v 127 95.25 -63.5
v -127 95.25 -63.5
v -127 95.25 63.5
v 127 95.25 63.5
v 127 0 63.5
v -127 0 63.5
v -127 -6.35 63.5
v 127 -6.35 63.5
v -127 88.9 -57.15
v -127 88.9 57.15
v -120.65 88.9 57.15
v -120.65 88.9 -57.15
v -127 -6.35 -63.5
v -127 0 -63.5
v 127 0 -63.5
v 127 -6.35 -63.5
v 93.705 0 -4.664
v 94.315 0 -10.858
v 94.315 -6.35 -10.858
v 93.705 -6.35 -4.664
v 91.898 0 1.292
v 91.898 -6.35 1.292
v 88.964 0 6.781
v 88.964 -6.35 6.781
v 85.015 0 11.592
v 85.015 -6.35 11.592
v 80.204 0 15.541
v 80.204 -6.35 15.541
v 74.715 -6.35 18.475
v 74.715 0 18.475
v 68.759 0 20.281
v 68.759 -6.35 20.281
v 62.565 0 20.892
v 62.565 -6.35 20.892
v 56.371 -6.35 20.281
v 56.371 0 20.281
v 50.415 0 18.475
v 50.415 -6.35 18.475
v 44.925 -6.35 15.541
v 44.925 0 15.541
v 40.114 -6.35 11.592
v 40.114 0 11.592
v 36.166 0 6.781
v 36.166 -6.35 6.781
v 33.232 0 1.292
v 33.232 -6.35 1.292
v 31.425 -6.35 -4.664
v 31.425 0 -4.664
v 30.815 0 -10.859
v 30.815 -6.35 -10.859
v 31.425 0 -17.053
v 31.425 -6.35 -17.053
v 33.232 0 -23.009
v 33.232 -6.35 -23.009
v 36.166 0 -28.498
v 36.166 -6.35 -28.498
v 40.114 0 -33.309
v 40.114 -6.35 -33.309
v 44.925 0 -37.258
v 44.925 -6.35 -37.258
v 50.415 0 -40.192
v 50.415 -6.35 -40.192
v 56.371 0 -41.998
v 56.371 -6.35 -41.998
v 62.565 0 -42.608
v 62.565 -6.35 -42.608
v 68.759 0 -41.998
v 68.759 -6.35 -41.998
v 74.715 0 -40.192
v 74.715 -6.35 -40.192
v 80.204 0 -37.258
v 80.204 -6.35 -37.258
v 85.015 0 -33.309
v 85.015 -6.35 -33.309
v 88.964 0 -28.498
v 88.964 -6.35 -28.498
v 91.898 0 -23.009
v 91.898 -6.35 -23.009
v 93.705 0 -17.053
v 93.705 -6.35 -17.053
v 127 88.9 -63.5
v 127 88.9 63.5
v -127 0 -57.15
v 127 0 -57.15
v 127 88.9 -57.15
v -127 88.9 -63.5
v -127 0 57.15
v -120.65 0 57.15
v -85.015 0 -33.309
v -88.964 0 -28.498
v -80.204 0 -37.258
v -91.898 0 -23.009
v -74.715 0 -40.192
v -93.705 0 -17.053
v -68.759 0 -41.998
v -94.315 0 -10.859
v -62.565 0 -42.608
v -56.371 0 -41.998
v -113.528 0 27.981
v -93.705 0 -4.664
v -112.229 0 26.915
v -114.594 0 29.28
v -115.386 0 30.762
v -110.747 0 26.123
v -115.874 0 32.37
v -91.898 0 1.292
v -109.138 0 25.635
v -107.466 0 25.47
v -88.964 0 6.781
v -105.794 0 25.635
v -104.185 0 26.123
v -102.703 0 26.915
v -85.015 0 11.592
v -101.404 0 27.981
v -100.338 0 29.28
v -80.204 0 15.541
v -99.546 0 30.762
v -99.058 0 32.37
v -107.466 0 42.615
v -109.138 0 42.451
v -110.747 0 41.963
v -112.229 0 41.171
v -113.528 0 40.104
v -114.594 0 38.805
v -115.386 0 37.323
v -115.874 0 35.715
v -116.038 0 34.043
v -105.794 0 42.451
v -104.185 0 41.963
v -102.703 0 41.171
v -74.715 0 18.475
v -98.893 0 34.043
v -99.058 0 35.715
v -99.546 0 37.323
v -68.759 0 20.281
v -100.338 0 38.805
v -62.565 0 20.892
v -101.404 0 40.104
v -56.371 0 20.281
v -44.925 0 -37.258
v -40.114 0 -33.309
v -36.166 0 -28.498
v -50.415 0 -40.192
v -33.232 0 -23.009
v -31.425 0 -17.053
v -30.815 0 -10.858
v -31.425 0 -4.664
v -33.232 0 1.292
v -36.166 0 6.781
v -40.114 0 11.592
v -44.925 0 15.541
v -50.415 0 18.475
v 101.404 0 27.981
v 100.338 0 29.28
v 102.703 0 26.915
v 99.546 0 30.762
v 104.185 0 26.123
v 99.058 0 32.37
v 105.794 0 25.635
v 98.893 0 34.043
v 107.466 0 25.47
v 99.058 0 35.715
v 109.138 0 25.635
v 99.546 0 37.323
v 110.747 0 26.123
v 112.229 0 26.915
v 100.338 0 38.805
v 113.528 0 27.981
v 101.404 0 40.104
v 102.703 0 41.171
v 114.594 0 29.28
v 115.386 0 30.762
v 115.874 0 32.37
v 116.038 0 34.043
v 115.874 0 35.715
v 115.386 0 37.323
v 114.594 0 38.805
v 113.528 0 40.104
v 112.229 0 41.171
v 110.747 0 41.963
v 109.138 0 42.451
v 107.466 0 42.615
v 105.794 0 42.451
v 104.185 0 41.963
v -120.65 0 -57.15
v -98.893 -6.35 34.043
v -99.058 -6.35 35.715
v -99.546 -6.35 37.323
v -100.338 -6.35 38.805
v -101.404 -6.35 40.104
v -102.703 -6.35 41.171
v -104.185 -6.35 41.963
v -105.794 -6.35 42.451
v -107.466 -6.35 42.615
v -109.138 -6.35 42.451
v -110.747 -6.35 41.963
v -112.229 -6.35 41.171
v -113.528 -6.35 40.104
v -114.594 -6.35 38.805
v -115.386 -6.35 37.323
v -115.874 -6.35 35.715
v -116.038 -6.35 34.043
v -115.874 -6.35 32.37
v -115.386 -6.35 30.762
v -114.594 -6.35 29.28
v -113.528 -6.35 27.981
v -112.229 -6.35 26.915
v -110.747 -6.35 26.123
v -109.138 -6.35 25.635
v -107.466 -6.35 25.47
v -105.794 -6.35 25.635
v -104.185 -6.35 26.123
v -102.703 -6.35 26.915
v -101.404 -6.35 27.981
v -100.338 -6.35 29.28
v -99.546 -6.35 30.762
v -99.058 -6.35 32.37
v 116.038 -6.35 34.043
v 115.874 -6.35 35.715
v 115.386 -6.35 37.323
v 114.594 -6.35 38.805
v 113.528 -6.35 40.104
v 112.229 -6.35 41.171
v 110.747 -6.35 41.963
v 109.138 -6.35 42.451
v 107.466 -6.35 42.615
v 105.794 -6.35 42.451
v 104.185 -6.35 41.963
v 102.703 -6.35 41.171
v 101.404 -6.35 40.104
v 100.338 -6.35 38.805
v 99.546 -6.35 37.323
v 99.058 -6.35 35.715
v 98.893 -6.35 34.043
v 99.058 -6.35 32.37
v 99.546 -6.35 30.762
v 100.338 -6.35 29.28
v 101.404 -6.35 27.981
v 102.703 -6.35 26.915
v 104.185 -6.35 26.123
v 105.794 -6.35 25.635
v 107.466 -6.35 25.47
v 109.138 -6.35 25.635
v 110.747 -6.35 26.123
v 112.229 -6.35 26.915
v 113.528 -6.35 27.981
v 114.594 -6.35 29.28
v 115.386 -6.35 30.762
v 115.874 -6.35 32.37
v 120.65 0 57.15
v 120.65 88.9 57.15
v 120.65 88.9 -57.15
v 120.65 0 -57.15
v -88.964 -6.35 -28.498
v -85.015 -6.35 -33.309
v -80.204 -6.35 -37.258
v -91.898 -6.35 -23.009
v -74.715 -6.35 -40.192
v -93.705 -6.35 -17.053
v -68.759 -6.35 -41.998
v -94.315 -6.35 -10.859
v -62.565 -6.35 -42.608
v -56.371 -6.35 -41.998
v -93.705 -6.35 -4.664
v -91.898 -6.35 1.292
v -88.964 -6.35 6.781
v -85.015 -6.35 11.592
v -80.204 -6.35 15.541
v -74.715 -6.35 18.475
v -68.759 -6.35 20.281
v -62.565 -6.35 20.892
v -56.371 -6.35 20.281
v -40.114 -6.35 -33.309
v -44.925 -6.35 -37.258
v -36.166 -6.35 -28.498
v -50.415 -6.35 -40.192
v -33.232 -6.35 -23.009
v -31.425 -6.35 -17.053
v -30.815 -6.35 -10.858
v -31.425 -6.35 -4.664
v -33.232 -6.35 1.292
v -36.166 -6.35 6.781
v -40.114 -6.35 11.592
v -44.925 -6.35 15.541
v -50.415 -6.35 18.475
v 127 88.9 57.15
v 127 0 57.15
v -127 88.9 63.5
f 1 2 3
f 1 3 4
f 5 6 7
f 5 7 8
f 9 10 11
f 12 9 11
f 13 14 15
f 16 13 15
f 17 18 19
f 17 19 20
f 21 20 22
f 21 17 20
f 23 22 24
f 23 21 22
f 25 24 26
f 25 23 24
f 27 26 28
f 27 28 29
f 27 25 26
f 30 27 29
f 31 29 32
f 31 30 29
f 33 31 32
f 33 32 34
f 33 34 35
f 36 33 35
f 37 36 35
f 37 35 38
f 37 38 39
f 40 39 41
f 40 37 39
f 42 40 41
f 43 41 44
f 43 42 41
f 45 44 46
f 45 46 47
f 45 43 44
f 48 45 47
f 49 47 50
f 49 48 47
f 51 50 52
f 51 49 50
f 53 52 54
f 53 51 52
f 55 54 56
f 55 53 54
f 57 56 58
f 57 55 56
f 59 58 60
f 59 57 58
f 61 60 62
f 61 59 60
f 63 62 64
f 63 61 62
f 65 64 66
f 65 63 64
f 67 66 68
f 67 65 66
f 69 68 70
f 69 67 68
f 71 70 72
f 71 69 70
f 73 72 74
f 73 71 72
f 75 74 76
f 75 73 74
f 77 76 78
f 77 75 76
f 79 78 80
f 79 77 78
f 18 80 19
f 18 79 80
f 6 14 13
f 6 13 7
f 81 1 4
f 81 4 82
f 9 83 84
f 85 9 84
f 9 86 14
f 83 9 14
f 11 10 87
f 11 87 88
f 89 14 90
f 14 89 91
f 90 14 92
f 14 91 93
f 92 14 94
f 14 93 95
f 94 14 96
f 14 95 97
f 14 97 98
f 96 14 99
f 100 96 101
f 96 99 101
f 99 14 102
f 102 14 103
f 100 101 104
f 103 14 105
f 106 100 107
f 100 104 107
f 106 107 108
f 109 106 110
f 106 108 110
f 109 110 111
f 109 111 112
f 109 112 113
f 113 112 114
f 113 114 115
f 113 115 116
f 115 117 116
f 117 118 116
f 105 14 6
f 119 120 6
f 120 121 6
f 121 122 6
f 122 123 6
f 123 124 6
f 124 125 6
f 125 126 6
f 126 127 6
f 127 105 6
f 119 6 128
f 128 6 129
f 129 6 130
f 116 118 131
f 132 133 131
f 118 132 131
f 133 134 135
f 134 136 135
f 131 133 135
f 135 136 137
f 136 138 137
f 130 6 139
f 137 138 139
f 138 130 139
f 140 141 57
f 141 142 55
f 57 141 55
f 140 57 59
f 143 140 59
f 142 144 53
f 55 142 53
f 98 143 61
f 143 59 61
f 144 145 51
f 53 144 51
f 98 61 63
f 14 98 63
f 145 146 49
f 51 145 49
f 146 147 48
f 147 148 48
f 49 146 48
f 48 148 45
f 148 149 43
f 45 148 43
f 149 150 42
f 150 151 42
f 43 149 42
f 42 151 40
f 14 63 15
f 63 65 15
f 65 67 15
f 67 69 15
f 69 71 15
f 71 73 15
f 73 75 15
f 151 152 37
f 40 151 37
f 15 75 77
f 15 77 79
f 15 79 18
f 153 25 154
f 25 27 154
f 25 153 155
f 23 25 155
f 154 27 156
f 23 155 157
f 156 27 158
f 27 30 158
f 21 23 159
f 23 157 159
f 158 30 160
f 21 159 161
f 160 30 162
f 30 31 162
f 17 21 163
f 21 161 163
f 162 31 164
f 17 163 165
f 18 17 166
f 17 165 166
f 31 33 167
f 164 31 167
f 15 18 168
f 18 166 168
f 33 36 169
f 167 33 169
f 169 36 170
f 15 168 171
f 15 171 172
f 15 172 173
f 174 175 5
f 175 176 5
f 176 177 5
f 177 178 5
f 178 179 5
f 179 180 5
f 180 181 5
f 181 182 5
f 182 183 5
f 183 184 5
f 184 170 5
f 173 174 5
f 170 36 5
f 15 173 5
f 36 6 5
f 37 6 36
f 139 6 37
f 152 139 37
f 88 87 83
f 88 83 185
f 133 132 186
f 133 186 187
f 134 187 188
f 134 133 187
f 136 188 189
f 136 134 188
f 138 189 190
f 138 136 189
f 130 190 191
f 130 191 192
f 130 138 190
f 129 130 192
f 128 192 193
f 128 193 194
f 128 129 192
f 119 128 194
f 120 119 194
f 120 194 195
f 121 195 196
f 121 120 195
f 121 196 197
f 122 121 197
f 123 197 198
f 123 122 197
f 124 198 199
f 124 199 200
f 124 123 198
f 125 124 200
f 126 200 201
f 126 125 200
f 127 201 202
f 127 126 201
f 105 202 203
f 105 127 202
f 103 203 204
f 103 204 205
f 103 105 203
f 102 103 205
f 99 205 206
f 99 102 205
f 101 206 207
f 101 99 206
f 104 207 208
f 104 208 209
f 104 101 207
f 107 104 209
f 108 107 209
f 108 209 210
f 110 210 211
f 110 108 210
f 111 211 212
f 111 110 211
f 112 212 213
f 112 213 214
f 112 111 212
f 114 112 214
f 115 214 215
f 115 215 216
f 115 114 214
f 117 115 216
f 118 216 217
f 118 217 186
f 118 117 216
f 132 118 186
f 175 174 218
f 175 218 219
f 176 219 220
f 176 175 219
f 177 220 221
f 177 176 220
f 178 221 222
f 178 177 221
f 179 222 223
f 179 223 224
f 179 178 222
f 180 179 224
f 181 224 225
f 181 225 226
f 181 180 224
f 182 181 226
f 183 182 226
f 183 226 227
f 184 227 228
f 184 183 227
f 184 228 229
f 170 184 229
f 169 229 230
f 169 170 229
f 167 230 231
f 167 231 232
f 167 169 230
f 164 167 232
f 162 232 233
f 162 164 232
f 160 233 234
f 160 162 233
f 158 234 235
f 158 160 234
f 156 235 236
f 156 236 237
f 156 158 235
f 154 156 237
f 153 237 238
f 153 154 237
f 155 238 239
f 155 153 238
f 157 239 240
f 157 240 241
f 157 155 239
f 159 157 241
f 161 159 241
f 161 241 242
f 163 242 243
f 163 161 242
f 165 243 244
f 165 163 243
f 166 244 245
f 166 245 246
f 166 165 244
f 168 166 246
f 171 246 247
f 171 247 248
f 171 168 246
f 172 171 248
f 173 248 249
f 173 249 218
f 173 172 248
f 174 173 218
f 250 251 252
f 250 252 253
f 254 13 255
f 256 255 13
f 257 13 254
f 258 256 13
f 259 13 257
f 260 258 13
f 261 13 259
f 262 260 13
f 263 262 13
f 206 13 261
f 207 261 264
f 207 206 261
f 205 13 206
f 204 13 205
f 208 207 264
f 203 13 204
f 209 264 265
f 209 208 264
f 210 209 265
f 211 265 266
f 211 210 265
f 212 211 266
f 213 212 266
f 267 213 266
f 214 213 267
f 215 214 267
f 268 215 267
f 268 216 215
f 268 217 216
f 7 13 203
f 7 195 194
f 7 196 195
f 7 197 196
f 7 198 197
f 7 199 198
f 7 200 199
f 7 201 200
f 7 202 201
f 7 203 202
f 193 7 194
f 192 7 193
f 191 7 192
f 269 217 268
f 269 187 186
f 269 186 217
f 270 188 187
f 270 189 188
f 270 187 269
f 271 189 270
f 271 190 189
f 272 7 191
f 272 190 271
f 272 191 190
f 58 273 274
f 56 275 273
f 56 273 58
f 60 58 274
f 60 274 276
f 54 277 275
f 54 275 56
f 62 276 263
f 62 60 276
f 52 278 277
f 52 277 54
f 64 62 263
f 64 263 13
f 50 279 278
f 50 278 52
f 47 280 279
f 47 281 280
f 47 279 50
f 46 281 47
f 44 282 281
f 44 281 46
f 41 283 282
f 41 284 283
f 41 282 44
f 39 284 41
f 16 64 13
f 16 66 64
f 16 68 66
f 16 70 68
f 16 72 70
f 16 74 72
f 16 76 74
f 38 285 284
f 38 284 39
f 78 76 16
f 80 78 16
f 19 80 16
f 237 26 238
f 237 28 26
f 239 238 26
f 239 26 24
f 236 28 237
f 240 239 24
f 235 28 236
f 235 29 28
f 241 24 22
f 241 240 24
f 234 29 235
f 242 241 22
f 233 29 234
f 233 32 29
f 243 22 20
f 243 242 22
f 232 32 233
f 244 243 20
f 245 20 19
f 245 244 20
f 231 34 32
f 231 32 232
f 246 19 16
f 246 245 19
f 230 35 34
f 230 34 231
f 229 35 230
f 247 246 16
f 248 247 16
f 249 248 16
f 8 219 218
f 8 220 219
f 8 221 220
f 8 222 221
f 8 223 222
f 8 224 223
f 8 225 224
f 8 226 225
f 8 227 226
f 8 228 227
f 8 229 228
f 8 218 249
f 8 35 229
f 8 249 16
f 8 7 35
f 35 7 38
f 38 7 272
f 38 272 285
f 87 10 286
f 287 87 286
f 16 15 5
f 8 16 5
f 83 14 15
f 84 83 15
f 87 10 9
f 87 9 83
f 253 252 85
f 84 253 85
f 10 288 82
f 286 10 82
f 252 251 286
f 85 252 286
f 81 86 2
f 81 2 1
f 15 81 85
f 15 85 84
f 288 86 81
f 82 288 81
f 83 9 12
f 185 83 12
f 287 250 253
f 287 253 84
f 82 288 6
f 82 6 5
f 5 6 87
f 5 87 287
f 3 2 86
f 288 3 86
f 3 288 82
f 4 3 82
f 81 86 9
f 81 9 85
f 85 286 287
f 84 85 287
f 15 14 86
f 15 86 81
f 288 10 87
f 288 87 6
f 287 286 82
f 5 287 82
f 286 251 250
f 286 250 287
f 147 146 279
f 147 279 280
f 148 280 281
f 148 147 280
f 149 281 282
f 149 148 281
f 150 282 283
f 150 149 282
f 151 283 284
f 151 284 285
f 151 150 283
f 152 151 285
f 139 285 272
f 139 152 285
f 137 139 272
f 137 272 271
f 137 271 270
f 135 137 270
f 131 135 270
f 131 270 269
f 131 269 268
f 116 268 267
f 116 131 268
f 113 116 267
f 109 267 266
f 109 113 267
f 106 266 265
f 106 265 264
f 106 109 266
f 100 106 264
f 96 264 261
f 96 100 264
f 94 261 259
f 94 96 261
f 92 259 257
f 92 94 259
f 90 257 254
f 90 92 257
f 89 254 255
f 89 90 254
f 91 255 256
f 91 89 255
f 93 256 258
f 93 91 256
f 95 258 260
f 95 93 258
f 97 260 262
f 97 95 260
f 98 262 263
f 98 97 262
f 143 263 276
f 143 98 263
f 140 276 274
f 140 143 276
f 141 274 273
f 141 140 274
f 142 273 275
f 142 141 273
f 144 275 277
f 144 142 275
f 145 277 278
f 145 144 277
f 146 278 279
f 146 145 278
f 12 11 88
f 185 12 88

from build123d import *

# Parameters (mm, degrees)
F0_W     = 254
F0_H     = 127
F0_R     = 31.75
F0_R_2   = 8.5725
F1_DEPTH = 6.35
F2_W     = 254
F2_H     = 88.9
F3_DEPTH = 6.35
F4_W     = 254
F4_H     = 6.35
F5_DEPTH = 127
F6_W     = 254
F6_H     = 6.35
F7_DEPTH = 88.9
F8_W     = 6.35
F8_H     = 88.9
F9_DEPTH = 114.3


with BuildPart() as f1:
    # F0 (on Front) → F1 (new body)
    with BuildSketch(Plane.XZ):
        Rectangle(F0_W, F0_H)
        with Locations((-62.5647103226, -10.8585)):
            Circle(F0_R, mode=Mode.SUBTRACT)
        with Locations((62.5647103226, -10.8585)):
            Circle(F0_R, mode=Mode.SUBTRACT)
        with Locations((-107.4659909279, 34.0427806053)):
            Circle(F0_R_2, mode=Mode.SUBTRACT)
        with Locations((107.4659909279, 34.0427806053)):
            Circle(F0_R_2, mode=Mode.SUBTRACT)
    extrude(amount=F1_DEPTH)


with BuildPart() as f3:
    # F2 (on face) → F3 (new body)
    with BuildSketch(Plane(origin=(0, 0, -63.5), x_dir=(1, 0, 0), z_dir=(0, 0, -1))):
        with Locations((0, -44.45)):
            Rectangle(F2_W, F2_H)
    extrude(amount=-F3_DEPTH)


with BuildPart() as f5:
    # F4 (on face) → F5 (new body)
    with BuildSketch(Plane(origin=(0, 0, -63.5), x_dir=(1, 0, 0), z_dir=(0, 0, -1))):
        with Locations((0, -92.075)):
            Rectangle(F4_W, F4_H)
    extrude(amount=-F5_DEPTH)


with BuildPart() as f7:
    # F6 (on face) → F7 (new body, through all)
    with BuildSketch(Plane.XZ.offset(-88.9)):
        with Locations((0, 60.325)):
            Rectangle(F6_W, F6_H)
    extrude(amount=F7_DEPTH)


with BuildPart() as f9:
    # F8 (on face) → F9 (new body, through all)
    with BuildSketch(Plane(origin=(0, 0, 57.15), x_dir=(1, 0, 0), z_dir=(0, 0, -1))):
        with Locations((-123.825, -44.45)):
            Rectangle(F8_W, F8_H)
    extrude(amount=F9_DEPTH)


with BuildPart() as f9b:
    # F8 (on face) → F9, piece 2 (new body, through all)
    with BuildSketch(Plane(origin=(0, 0, 57.15), x_dir=(1, 0, 0), z_dir=(0, 0, -1))):
        with Locations((123.825, -44.45)):
            Rectangle(F8_W, F8_H)
    extrude(amount=F9_DEPTH)


solid = Compound([f1.part, f3.part, f5.part, f7.part, f9.part, f9b.part])
